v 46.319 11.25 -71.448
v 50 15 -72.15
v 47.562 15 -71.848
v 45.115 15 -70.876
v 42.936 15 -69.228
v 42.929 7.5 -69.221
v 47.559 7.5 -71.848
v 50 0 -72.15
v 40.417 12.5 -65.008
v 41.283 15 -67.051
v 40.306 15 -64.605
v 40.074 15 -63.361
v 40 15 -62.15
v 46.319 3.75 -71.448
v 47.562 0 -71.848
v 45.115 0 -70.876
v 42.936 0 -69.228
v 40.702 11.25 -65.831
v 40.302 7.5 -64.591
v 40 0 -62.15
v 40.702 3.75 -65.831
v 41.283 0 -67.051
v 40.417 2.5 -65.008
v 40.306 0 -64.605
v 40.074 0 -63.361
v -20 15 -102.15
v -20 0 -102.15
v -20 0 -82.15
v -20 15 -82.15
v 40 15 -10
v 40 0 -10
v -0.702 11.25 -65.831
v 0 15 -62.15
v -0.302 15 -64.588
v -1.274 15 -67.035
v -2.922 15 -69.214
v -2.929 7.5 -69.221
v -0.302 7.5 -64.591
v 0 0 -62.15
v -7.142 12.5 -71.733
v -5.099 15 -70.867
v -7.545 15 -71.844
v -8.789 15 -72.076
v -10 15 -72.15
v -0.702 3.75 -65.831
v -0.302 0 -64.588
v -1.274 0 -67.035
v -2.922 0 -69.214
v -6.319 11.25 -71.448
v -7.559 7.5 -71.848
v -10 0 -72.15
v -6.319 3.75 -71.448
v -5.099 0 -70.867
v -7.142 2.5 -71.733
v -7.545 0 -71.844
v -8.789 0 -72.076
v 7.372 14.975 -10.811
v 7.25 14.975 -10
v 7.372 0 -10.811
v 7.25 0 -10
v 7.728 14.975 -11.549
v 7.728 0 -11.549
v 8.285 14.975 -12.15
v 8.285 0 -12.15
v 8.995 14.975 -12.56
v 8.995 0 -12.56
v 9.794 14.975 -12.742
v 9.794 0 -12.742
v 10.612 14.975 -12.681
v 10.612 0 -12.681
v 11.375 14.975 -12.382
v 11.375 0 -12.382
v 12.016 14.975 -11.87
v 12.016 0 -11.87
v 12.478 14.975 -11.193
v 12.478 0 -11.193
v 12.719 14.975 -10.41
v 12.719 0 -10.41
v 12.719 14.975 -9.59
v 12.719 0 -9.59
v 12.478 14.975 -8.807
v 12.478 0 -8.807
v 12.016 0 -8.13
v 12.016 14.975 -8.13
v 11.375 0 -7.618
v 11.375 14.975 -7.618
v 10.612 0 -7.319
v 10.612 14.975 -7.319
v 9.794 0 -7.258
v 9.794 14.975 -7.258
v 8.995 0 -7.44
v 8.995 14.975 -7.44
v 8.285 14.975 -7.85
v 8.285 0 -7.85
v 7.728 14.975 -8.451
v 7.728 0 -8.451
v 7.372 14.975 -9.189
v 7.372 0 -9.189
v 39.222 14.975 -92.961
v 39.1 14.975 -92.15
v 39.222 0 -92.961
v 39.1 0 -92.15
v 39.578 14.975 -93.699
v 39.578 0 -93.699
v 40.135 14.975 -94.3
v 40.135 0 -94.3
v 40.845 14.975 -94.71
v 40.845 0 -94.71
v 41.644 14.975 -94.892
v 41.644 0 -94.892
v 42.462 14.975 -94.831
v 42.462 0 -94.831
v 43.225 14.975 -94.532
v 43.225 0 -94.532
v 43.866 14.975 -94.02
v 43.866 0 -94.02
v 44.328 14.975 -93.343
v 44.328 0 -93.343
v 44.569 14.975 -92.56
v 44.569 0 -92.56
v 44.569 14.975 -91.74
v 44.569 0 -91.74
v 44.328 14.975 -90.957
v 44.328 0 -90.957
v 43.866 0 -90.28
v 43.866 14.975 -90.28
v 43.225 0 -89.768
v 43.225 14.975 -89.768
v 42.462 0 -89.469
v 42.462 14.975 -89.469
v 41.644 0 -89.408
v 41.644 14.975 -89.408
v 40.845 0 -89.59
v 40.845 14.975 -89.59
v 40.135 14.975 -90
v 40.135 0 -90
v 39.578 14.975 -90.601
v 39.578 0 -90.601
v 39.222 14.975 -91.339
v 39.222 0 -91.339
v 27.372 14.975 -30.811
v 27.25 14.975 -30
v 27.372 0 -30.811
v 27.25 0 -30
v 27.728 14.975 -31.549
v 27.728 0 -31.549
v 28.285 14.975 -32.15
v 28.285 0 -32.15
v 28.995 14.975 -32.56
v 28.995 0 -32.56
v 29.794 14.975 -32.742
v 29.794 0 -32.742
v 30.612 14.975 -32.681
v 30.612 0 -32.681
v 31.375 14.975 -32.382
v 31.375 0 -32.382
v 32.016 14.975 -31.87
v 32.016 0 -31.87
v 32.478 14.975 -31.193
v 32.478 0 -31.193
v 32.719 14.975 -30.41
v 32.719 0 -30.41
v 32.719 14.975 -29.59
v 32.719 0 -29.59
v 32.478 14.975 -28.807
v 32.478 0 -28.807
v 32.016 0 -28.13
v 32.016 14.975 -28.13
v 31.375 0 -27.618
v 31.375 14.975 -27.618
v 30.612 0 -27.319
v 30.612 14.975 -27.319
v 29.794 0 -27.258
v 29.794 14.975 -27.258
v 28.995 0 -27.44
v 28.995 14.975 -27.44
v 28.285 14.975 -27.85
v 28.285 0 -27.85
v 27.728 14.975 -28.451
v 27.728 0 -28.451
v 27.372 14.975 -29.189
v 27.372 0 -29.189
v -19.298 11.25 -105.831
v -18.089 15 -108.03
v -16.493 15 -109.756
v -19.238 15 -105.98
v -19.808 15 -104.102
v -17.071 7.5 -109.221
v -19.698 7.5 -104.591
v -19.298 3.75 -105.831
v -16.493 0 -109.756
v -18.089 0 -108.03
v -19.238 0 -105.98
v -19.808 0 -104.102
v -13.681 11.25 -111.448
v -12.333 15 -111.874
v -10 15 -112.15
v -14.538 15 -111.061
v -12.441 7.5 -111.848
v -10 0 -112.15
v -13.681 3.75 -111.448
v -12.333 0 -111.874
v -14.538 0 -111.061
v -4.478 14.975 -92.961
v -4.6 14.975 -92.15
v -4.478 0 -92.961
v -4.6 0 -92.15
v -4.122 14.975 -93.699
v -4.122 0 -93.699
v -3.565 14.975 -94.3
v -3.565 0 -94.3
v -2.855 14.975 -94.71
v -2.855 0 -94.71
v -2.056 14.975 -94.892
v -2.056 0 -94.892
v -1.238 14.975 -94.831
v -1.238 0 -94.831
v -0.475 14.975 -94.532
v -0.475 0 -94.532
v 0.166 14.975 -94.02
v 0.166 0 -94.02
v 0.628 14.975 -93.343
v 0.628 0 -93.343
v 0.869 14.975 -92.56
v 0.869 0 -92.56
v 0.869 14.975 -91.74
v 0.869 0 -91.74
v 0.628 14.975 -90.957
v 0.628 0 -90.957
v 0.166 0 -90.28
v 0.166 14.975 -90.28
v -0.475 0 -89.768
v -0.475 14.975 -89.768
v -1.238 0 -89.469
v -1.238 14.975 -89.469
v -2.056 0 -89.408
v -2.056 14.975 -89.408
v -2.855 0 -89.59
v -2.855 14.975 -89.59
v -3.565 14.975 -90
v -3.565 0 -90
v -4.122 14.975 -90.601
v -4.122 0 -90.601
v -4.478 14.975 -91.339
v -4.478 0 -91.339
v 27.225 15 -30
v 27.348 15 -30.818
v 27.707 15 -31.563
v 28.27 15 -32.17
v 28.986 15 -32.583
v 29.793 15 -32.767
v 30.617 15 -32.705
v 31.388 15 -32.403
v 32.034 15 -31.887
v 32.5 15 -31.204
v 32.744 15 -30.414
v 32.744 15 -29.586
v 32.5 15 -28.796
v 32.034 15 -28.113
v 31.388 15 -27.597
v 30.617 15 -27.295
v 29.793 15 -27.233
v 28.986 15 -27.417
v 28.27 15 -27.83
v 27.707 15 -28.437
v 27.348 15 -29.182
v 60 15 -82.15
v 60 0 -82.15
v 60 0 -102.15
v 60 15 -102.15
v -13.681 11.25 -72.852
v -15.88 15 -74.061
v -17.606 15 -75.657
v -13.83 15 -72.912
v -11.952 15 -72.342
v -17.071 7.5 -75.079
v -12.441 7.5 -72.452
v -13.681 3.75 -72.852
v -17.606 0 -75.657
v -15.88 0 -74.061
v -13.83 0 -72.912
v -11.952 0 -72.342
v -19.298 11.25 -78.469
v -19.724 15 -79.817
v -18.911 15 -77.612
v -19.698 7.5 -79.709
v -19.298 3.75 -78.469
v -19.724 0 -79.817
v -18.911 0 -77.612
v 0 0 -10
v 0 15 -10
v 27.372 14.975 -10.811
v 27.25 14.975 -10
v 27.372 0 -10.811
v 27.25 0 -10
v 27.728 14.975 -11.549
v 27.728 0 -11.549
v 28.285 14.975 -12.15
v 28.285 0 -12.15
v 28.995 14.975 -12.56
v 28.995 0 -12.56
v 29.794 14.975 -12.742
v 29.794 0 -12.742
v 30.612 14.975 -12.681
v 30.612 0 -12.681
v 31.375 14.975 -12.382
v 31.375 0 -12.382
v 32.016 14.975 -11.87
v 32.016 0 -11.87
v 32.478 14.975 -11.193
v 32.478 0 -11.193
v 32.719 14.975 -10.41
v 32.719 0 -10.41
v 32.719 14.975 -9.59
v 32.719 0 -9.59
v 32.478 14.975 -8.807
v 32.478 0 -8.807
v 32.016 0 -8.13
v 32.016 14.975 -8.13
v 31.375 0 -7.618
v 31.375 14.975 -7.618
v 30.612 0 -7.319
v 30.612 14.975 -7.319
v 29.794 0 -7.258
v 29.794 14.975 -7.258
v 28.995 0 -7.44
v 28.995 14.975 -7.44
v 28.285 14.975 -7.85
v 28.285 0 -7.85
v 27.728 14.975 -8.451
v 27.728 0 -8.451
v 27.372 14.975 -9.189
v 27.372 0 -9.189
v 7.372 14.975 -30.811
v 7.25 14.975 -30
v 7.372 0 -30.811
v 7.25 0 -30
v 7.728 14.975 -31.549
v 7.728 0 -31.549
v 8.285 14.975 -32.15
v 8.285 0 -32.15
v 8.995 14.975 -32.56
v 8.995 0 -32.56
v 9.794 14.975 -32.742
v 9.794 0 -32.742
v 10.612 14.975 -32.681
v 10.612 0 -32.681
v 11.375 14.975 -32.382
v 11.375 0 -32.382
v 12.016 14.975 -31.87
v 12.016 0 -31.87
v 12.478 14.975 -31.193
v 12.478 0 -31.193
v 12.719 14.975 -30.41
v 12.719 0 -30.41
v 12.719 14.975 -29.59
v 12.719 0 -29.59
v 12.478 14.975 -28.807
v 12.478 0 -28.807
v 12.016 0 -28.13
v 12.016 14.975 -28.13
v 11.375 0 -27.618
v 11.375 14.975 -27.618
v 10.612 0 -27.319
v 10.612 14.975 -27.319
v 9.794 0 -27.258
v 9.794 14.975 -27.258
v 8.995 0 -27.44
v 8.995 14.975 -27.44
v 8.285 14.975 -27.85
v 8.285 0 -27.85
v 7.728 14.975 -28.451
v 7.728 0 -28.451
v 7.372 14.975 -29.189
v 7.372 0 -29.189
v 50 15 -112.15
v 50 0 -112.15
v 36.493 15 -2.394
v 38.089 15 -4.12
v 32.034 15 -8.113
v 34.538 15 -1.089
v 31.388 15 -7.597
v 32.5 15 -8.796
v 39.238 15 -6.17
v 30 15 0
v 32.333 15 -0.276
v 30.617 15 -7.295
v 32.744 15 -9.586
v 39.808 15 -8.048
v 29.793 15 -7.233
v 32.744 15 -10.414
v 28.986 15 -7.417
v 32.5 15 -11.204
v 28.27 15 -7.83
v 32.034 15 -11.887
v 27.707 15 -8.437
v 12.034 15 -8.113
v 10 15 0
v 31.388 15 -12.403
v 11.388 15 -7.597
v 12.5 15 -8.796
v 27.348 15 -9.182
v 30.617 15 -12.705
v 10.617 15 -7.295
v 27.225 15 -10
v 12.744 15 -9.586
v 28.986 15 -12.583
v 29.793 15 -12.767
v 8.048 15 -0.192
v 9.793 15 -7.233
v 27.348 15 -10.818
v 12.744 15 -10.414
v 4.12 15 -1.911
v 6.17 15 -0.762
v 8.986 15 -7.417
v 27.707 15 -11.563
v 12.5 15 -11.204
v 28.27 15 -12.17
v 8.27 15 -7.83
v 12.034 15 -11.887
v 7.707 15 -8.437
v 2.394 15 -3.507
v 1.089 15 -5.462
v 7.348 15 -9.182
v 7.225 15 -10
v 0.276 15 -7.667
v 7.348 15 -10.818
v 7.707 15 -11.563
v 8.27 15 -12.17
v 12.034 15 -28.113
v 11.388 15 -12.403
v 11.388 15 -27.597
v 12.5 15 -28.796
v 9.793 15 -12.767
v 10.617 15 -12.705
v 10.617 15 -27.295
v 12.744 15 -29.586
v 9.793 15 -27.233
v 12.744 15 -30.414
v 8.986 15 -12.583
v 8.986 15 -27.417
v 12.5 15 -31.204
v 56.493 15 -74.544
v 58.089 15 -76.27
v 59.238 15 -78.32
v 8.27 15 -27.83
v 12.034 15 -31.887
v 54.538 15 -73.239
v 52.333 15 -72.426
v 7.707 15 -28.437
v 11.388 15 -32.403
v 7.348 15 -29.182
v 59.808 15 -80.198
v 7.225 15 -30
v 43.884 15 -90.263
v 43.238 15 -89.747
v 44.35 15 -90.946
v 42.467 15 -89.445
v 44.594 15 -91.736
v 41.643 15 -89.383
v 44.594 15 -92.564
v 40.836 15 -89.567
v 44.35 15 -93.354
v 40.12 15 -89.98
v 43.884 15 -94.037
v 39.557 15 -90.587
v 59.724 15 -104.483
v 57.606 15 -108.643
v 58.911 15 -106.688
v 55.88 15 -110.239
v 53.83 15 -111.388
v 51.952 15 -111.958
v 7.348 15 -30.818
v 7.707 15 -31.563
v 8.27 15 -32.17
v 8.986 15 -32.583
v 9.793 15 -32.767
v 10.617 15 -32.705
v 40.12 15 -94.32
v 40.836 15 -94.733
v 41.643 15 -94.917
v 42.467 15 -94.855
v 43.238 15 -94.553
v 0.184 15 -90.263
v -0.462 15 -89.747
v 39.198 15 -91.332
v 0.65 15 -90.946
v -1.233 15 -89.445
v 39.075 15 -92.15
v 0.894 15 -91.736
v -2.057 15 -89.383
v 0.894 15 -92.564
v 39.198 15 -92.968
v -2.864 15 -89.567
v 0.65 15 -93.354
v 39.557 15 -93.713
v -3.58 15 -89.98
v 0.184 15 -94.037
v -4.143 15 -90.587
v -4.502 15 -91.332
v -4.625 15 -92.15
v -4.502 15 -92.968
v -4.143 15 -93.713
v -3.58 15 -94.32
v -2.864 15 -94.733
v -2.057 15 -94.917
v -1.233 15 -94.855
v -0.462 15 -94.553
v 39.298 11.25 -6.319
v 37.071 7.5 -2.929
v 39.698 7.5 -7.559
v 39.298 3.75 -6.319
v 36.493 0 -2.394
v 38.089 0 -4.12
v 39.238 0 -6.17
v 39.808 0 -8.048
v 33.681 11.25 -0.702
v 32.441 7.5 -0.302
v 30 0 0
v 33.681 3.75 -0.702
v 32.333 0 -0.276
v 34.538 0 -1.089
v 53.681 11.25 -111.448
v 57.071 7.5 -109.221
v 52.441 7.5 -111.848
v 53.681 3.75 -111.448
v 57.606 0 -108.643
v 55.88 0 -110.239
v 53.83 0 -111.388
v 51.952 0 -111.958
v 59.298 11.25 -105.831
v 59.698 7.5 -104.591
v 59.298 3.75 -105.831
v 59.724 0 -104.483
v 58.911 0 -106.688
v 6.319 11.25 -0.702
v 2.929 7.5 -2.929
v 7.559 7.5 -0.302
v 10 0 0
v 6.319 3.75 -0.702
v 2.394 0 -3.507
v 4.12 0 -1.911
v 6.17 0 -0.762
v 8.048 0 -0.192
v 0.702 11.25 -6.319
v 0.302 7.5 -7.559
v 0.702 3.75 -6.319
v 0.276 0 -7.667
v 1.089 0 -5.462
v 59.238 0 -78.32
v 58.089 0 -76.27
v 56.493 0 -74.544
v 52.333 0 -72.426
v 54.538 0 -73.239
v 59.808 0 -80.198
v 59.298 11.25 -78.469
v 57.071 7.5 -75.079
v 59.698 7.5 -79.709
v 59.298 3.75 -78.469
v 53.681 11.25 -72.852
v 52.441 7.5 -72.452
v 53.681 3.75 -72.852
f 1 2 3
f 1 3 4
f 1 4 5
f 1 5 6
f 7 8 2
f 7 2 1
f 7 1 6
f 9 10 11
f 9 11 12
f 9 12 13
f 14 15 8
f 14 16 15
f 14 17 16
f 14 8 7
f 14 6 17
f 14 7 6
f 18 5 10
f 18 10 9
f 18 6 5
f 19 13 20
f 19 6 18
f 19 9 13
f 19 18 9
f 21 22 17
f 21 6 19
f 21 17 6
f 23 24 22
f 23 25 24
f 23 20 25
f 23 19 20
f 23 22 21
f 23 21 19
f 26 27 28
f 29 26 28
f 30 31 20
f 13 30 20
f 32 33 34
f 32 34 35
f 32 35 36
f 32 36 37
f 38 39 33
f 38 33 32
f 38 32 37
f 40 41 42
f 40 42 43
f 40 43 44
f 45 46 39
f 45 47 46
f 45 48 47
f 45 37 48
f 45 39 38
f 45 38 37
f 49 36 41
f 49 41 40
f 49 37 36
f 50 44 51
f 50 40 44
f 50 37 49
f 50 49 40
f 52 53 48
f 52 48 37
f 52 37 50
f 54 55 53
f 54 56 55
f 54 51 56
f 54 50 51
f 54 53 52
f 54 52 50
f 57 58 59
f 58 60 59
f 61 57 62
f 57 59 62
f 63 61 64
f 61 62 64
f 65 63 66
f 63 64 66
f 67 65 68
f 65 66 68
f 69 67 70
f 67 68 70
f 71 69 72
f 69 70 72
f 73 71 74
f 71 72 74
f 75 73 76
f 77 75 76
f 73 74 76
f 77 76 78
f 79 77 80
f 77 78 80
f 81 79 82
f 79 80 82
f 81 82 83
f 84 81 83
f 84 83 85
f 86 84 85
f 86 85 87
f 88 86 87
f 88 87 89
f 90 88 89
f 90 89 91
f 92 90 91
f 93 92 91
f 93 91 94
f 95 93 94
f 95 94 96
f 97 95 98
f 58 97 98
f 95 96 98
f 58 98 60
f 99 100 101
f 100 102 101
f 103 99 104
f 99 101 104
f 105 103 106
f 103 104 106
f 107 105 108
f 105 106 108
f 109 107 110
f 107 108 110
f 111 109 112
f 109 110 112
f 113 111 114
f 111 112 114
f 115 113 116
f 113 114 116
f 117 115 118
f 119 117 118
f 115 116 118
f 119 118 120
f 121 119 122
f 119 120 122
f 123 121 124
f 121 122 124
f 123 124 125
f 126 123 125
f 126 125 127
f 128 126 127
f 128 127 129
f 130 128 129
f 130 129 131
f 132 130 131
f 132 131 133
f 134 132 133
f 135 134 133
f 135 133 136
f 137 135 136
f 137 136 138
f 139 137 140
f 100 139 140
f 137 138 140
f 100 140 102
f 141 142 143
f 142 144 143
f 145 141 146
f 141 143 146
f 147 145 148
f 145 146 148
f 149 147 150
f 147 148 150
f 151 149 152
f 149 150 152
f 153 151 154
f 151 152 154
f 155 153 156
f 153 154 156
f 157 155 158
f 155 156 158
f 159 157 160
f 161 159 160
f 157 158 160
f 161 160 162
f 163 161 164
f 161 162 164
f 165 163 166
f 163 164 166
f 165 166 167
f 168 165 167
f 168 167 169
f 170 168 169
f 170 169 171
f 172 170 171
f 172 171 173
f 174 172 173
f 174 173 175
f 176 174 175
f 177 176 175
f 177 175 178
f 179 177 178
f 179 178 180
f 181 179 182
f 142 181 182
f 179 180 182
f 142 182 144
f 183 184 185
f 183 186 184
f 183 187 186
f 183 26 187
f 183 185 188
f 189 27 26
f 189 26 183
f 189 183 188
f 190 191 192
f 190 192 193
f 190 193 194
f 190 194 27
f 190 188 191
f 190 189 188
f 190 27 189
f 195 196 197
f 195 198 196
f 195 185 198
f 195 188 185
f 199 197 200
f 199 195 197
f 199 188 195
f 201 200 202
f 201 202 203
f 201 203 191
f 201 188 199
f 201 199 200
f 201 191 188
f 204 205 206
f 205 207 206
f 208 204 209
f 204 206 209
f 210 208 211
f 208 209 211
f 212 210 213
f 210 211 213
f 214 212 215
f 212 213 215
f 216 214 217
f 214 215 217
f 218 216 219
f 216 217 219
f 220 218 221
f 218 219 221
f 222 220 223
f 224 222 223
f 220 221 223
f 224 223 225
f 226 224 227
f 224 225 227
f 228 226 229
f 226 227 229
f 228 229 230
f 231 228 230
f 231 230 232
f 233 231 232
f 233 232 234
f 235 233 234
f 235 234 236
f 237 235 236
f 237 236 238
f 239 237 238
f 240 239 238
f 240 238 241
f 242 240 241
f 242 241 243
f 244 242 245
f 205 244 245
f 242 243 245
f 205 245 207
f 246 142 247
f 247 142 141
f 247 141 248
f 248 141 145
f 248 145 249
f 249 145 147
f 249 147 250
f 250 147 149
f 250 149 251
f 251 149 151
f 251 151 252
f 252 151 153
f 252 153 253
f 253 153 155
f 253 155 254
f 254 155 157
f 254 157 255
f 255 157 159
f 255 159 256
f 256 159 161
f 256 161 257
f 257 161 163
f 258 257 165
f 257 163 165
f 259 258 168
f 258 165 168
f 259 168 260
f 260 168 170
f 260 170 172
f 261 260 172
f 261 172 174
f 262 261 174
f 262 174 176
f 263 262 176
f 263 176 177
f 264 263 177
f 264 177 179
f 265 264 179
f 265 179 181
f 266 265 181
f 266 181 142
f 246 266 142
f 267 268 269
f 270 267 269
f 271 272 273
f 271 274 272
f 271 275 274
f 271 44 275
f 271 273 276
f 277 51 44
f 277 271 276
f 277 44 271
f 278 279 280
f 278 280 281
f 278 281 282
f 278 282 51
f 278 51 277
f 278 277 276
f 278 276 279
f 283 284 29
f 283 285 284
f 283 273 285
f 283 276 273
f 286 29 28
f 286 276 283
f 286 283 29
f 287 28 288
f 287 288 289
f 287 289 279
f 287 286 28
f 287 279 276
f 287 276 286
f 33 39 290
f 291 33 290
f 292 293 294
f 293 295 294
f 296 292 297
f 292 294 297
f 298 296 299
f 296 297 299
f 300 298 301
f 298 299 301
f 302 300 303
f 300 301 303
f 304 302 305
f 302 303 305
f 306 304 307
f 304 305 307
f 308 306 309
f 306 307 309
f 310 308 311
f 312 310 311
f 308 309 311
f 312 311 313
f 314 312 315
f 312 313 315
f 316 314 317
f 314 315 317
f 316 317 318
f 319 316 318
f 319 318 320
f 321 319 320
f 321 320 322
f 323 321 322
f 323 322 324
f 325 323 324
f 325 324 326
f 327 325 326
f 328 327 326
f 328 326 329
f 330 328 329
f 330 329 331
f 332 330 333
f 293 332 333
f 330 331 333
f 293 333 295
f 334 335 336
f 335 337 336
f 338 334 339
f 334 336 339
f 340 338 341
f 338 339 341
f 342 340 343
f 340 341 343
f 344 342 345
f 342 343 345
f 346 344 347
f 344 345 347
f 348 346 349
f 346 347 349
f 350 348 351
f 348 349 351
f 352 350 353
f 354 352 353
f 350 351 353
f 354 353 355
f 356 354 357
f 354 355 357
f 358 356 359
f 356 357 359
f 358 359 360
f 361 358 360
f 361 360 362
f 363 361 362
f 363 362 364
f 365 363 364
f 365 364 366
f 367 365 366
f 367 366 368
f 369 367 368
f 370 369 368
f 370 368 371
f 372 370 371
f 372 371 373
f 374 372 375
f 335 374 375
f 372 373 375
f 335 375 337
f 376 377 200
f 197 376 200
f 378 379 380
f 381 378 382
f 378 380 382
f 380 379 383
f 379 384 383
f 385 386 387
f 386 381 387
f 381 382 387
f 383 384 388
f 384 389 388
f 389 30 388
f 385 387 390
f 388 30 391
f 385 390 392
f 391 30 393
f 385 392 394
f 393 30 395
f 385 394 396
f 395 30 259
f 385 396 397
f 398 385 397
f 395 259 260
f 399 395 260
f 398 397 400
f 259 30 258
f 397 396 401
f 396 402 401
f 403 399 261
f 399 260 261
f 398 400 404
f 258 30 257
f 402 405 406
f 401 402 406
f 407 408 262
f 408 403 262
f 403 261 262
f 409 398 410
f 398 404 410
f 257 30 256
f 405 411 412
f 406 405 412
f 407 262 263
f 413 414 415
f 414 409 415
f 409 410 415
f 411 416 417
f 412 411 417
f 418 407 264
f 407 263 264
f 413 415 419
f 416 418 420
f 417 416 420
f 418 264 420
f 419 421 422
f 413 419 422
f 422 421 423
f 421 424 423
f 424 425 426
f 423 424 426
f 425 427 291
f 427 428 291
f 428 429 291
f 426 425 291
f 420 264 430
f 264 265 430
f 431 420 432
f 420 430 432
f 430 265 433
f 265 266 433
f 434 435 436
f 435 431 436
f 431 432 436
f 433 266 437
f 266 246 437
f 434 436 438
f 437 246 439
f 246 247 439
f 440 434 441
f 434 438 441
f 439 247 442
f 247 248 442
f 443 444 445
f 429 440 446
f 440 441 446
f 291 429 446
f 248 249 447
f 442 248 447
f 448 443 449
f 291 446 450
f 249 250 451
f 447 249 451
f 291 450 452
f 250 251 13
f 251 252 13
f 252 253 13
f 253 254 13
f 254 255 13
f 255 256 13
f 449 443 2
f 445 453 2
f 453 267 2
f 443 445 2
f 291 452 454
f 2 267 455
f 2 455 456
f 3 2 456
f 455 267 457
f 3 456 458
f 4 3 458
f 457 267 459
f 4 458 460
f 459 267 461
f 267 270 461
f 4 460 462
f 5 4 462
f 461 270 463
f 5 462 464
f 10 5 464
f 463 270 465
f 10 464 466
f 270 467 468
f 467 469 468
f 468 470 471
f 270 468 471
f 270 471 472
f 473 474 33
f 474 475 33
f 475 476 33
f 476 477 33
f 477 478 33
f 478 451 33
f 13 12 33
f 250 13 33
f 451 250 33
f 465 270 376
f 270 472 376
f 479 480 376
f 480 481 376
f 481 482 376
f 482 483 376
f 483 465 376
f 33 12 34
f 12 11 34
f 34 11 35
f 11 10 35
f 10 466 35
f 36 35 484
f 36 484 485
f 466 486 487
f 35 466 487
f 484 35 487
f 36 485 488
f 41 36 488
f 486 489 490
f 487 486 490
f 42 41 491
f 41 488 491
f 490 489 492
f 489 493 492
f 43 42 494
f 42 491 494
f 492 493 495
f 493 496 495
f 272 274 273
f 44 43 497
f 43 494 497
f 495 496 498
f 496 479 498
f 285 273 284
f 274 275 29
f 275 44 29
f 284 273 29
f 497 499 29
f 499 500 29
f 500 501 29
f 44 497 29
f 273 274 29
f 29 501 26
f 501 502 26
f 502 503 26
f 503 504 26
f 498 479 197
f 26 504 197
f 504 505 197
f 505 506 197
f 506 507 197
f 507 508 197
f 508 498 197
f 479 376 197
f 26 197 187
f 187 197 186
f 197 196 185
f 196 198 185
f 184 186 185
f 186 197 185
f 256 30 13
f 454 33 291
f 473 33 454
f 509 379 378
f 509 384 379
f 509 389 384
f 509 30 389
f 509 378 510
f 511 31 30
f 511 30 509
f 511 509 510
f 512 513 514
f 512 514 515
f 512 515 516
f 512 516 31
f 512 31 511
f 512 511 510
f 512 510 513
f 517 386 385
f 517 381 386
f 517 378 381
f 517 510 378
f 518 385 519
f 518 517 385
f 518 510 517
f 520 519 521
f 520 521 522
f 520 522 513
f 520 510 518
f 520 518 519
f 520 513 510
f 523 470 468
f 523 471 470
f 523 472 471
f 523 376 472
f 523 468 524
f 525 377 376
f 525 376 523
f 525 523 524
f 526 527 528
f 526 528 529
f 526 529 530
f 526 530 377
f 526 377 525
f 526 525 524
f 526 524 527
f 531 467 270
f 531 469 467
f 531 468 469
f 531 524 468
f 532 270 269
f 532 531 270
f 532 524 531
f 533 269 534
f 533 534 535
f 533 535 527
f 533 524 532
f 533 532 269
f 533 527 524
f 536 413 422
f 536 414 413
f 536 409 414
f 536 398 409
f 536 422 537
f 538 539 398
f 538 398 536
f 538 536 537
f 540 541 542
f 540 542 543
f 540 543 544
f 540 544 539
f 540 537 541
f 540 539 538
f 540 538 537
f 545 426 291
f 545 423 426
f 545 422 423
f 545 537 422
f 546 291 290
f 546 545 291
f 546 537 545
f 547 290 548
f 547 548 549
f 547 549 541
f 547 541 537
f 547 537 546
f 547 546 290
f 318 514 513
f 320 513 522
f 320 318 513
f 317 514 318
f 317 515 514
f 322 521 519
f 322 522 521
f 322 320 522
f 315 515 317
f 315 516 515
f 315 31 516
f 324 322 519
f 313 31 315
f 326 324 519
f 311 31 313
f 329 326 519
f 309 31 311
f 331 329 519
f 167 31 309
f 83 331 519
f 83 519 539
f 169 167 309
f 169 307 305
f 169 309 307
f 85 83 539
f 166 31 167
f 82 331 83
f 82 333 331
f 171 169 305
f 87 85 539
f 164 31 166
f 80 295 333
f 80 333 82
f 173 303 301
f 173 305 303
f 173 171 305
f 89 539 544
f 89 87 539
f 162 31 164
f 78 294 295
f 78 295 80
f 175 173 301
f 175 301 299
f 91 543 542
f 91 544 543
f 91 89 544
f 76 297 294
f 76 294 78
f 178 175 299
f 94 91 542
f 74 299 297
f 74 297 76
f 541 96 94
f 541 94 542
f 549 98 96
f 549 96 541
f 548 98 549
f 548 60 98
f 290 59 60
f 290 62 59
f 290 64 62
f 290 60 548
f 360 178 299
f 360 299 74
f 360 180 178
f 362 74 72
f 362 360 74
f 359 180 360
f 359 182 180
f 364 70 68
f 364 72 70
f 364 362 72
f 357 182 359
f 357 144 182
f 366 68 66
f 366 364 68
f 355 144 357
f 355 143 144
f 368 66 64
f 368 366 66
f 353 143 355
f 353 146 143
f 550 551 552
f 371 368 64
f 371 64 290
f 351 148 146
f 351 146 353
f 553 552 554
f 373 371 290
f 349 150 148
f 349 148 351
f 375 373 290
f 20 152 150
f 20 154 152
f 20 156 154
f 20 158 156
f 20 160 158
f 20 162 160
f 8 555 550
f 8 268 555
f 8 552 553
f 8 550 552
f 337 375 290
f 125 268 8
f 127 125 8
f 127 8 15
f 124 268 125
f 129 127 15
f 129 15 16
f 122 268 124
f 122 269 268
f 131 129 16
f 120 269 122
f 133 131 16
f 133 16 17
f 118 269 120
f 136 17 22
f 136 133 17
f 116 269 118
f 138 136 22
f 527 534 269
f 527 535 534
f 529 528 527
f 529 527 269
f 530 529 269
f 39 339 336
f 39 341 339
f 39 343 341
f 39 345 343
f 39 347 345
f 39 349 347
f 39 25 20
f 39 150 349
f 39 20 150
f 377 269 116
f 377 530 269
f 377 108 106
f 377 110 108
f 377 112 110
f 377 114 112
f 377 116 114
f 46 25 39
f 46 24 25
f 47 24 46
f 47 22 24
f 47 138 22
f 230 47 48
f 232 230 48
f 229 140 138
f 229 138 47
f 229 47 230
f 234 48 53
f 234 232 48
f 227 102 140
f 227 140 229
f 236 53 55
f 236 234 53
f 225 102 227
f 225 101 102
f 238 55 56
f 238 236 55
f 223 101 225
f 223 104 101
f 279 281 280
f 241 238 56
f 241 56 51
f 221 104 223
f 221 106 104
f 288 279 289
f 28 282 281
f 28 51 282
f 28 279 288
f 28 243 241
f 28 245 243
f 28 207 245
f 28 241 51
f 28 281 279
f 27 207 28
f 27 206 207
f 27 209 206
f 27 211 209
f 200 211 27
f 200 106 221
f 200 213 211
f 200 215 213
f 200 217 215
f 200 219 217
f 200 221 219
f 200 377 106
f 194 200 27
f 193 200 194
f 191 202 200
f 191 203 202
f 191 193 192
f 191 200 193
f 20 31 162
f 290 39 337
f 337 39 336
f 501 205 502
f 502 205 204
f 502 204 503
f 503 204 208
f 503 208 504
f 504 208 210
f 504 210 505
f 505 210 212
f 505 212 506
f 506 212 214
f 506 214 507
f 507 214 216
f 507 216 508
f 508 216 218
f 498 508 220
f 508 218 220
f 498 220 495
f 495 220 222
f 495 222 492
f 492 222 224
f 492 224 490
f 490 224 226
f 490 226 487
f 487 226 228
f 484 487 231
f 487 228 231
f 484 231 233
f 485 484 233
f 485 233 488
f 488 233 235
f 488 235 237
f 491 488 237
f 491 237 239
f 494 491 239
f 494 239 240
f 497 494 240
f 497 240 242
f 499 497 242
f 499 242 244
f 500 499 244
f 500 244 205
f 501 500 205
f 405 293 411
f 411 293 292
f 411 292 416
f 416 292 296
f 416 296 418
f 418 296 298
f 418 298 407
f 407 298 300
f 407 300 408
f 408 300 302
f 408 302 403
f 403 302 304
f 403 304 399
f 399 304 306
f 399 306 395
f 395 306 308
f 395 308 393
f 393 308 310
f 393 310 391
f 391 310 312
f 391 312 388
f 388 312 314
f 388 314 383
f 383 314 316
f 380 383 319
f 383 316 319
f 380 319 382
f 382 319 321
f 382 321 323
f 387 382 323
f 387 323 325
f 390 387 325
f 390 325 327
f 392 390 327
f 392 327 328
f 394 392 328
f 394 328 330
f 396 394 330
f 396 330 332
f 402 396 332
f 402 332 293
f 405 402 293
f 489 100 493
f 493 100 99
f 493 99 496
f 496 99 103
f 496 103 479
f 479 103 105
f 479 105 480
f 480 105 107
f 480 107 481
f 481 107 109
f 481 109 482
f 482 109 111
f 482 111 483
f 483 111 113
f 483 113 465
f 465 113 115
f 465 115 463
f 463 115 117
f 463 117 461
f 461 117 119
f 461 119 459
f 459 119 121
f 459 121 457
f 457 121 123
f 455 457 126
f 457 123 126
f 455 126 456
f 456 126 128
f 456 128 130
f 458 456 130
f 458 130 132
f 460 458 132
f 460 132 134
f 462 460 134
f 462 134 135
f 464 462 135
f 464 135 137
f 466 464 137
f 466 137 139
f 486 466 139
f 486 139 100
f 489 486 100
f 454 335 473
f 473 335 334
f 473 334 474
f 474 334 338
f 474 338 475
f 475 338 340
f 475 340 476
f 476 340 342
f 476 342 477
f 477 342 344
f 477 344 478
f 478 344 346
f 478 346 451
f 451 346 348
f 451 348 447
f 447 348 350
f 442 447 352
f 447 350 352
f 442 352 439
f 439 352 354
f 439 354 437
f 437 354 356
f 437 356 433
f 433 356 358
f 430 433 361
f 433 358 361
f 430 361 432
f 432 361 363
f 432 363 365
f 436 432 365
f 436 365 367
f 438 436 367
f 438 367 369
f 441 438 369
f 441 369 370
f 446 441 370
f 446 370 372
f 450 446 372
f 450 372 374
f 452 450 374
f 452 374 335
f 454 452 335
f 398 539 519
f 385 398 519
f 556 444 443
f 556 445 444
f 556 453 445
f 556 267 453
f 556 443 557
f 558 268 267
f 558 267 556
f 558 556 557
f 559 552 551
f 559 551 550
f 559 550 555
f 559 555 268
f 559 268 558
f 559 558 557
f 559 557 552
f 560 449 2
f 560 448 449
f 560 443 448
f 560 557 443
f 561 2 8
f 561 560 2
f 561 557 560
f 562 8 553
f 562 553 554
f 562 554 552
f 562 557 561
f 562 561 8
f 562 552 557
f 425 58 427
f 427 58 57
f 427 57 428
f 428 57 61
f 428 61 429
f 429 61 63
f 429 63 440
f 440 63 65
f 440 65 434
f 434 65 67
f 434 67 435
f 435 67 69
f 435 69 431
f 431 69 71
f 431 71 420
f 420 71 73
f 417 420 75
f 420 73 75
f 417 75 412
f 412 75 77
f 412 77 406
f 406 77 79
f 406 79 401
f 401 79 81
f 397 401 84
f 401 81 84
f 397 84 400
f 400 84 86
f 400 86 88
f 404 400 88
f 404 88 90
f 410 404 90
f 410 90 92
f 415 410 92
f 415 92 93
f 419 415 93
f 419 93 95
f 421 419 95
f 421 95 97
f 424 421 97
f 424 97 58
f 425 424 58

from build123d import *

# Parameters (mm, degrees)
BOSS_EXTRUDE1_DEPTH            = 15
M5_CLEARANCE_HOLE1_D           = 5.5
M5_CLEARANCE_HOLE1_CSINK_D     = 5.55
M5_CLEARANCE_HOLE1_CSINK_ANGLE = 90
FILLET1_START                  = -1
FILLET1_DEPTH                  = 17
FILLET1_2_DEPTH                = 15


with BuildPart() as part:
    # Sketch1 → Boss-Extrude1 (new body)
    with BuildSketch(Plane(origin=(0, 0, 0), x_dir=(1, 0, 0), z_dir=(0, 1, 0))):
        Polygon((0, 0), (40, 0), (40, 72.15), (60, 72.15), (60, 112.15), (-20, 112.15), (-20, 72.15), (0, 72.15), align=None)
    extrude(amount=BOSS_EXTRUDE1_DEPTH)

    # M5 Clearance Hole1 (through all)
    with Locations(Plane(origin=(0, 15, 0), x_dir=(1, 0, 0), z_dir=(0, 1, 0))):
        with Locations((-1.85, 92.15), (41.85, 92.15), (10, 30), (30, 30), (10, 10), (30, 10)):
            CounterSinkHole(M5_CLEARANCE_HOLE1_D / 2, M5_CLEARANCE_HOLE1_CSINK_D / 2, counter_sink_angle=M5_CLEARANCE_HOLE1_CSINK_ANGLE)

    # Fillet1: read off the stored shape, not the designer's step
    # Fillet1 outline → Fillet1 (cut)
    with BuildSketch(Plane(origin=(0, 0, 0), x_dir=(1, 0, 0), z_dir=(0, 1, 0)).offset(FILLET1_START)):
        with BuildLine():
            Line((0, 0), (10, 0))
            add(Edge.make_bspline(
                [(10, 0), (0, 0), (0, 10)],
                knots=[0, 0, 0, 1, 1, 1], degree=2, weights=[1, 0.707106781, 1]))
            Line((0, 10), (0, 0))
        make_face()
        with BuildLine():
            add(Edge.make_bspline(
                [(40, 10), (40, 0), (30, 0)],
                knots=[0, 0, 0, 1, 1, 1], degree=2, weights=[1, 0.707106781, 1]))
            Line((30, 0), (40, 0))
            Line((40, 0), (40, 10))
        make_face()
        with BuildLine():
            Line((-20, 72.15), (-10, 72.15))
            add(Edge.make_bspline(
                [(-10, 72.15), (-20, 72.15), (-20, 82.15)],
                knots=[0, 0, 0, 1, 1, 1], degree=2, weights=[1, 0.707106781, 1]))
            Line((-20, 82.15), (-20, 72.15))
        make_face()
        with BuildLine():
            add(Edge.make_bspline(
                [(60, 82.15), (60, 72.15), (50, 72.15)],
                knots=[0, 0, 0, 1, 1, 1], degree=2, weights=[1, 0.707106781, 1]))
            Line((50, 72.15), (60, 72.15))
            Line((60, 72.15), (60, 82.15))
        make_face()
        with BuildLine():
            Line((-20, 112.15), (-20, 102.15))
            add(Edge.make_bspline(
                [(-20, 102.15), (-20, 112.15), (-10, 112.15)],
                knots=[0, 0, 0, 1, 1, 1], degree=2, weights=[1, 0.707106781, 1]))
            Line((-10, 112.15), (-20, 112.15))
        make_face()
        with BuildLine():
            add(Edge.make_bspline(
                [(50, 112.15), (60, 112.15), (60, 102.15)],
                knots=[0, 0, 0, 1, 1, 1], degree=2, weights=[1, 0.707106781, 1]))
            Line((60, 102.15), (60, 112.15))
            Line((60, 112.15), (50, 112.15))
        make_face()
    extrude(amount=FILLET1_DEPTH, mode=Mode.SUBTRACT)

    # Fillet1 2 outline → Fillet1 2 (add)
    with BuildSketch(Plane(origin=(0, 0, 0), x_dir=(1, 0, 0), z_dir=(0, 1, 0))):
        with BuildLine():
            add(Edge.make_bspline(
                [(0, 62.15), (0, 72.15), (-10, 72.15)],
                knots=[0, 0, 0, 1, 1, 1], degree=2, weights=[1, 0.707106781, 1]))
            Line((0, 62.15), (0, 72.15))
            Line((0, 72.15), (-10, 72.15))
        make_face()
        with BuildLine():
            Line((40, 72.15), (40, 62.15))
            add(Edge.make_bspline(
                [(50, 72.15), (40, 72.15), (40, 62.15)],
                knots=[0, 0, 0, 1, 1, 1], degree=2, weights=[1, 0.707106781, 1]))
            Line((50, 72.15), (40, 72.15))
        make_face()
    extrude(amount=FILLET1_2_DEPTH)


solid = part.part
